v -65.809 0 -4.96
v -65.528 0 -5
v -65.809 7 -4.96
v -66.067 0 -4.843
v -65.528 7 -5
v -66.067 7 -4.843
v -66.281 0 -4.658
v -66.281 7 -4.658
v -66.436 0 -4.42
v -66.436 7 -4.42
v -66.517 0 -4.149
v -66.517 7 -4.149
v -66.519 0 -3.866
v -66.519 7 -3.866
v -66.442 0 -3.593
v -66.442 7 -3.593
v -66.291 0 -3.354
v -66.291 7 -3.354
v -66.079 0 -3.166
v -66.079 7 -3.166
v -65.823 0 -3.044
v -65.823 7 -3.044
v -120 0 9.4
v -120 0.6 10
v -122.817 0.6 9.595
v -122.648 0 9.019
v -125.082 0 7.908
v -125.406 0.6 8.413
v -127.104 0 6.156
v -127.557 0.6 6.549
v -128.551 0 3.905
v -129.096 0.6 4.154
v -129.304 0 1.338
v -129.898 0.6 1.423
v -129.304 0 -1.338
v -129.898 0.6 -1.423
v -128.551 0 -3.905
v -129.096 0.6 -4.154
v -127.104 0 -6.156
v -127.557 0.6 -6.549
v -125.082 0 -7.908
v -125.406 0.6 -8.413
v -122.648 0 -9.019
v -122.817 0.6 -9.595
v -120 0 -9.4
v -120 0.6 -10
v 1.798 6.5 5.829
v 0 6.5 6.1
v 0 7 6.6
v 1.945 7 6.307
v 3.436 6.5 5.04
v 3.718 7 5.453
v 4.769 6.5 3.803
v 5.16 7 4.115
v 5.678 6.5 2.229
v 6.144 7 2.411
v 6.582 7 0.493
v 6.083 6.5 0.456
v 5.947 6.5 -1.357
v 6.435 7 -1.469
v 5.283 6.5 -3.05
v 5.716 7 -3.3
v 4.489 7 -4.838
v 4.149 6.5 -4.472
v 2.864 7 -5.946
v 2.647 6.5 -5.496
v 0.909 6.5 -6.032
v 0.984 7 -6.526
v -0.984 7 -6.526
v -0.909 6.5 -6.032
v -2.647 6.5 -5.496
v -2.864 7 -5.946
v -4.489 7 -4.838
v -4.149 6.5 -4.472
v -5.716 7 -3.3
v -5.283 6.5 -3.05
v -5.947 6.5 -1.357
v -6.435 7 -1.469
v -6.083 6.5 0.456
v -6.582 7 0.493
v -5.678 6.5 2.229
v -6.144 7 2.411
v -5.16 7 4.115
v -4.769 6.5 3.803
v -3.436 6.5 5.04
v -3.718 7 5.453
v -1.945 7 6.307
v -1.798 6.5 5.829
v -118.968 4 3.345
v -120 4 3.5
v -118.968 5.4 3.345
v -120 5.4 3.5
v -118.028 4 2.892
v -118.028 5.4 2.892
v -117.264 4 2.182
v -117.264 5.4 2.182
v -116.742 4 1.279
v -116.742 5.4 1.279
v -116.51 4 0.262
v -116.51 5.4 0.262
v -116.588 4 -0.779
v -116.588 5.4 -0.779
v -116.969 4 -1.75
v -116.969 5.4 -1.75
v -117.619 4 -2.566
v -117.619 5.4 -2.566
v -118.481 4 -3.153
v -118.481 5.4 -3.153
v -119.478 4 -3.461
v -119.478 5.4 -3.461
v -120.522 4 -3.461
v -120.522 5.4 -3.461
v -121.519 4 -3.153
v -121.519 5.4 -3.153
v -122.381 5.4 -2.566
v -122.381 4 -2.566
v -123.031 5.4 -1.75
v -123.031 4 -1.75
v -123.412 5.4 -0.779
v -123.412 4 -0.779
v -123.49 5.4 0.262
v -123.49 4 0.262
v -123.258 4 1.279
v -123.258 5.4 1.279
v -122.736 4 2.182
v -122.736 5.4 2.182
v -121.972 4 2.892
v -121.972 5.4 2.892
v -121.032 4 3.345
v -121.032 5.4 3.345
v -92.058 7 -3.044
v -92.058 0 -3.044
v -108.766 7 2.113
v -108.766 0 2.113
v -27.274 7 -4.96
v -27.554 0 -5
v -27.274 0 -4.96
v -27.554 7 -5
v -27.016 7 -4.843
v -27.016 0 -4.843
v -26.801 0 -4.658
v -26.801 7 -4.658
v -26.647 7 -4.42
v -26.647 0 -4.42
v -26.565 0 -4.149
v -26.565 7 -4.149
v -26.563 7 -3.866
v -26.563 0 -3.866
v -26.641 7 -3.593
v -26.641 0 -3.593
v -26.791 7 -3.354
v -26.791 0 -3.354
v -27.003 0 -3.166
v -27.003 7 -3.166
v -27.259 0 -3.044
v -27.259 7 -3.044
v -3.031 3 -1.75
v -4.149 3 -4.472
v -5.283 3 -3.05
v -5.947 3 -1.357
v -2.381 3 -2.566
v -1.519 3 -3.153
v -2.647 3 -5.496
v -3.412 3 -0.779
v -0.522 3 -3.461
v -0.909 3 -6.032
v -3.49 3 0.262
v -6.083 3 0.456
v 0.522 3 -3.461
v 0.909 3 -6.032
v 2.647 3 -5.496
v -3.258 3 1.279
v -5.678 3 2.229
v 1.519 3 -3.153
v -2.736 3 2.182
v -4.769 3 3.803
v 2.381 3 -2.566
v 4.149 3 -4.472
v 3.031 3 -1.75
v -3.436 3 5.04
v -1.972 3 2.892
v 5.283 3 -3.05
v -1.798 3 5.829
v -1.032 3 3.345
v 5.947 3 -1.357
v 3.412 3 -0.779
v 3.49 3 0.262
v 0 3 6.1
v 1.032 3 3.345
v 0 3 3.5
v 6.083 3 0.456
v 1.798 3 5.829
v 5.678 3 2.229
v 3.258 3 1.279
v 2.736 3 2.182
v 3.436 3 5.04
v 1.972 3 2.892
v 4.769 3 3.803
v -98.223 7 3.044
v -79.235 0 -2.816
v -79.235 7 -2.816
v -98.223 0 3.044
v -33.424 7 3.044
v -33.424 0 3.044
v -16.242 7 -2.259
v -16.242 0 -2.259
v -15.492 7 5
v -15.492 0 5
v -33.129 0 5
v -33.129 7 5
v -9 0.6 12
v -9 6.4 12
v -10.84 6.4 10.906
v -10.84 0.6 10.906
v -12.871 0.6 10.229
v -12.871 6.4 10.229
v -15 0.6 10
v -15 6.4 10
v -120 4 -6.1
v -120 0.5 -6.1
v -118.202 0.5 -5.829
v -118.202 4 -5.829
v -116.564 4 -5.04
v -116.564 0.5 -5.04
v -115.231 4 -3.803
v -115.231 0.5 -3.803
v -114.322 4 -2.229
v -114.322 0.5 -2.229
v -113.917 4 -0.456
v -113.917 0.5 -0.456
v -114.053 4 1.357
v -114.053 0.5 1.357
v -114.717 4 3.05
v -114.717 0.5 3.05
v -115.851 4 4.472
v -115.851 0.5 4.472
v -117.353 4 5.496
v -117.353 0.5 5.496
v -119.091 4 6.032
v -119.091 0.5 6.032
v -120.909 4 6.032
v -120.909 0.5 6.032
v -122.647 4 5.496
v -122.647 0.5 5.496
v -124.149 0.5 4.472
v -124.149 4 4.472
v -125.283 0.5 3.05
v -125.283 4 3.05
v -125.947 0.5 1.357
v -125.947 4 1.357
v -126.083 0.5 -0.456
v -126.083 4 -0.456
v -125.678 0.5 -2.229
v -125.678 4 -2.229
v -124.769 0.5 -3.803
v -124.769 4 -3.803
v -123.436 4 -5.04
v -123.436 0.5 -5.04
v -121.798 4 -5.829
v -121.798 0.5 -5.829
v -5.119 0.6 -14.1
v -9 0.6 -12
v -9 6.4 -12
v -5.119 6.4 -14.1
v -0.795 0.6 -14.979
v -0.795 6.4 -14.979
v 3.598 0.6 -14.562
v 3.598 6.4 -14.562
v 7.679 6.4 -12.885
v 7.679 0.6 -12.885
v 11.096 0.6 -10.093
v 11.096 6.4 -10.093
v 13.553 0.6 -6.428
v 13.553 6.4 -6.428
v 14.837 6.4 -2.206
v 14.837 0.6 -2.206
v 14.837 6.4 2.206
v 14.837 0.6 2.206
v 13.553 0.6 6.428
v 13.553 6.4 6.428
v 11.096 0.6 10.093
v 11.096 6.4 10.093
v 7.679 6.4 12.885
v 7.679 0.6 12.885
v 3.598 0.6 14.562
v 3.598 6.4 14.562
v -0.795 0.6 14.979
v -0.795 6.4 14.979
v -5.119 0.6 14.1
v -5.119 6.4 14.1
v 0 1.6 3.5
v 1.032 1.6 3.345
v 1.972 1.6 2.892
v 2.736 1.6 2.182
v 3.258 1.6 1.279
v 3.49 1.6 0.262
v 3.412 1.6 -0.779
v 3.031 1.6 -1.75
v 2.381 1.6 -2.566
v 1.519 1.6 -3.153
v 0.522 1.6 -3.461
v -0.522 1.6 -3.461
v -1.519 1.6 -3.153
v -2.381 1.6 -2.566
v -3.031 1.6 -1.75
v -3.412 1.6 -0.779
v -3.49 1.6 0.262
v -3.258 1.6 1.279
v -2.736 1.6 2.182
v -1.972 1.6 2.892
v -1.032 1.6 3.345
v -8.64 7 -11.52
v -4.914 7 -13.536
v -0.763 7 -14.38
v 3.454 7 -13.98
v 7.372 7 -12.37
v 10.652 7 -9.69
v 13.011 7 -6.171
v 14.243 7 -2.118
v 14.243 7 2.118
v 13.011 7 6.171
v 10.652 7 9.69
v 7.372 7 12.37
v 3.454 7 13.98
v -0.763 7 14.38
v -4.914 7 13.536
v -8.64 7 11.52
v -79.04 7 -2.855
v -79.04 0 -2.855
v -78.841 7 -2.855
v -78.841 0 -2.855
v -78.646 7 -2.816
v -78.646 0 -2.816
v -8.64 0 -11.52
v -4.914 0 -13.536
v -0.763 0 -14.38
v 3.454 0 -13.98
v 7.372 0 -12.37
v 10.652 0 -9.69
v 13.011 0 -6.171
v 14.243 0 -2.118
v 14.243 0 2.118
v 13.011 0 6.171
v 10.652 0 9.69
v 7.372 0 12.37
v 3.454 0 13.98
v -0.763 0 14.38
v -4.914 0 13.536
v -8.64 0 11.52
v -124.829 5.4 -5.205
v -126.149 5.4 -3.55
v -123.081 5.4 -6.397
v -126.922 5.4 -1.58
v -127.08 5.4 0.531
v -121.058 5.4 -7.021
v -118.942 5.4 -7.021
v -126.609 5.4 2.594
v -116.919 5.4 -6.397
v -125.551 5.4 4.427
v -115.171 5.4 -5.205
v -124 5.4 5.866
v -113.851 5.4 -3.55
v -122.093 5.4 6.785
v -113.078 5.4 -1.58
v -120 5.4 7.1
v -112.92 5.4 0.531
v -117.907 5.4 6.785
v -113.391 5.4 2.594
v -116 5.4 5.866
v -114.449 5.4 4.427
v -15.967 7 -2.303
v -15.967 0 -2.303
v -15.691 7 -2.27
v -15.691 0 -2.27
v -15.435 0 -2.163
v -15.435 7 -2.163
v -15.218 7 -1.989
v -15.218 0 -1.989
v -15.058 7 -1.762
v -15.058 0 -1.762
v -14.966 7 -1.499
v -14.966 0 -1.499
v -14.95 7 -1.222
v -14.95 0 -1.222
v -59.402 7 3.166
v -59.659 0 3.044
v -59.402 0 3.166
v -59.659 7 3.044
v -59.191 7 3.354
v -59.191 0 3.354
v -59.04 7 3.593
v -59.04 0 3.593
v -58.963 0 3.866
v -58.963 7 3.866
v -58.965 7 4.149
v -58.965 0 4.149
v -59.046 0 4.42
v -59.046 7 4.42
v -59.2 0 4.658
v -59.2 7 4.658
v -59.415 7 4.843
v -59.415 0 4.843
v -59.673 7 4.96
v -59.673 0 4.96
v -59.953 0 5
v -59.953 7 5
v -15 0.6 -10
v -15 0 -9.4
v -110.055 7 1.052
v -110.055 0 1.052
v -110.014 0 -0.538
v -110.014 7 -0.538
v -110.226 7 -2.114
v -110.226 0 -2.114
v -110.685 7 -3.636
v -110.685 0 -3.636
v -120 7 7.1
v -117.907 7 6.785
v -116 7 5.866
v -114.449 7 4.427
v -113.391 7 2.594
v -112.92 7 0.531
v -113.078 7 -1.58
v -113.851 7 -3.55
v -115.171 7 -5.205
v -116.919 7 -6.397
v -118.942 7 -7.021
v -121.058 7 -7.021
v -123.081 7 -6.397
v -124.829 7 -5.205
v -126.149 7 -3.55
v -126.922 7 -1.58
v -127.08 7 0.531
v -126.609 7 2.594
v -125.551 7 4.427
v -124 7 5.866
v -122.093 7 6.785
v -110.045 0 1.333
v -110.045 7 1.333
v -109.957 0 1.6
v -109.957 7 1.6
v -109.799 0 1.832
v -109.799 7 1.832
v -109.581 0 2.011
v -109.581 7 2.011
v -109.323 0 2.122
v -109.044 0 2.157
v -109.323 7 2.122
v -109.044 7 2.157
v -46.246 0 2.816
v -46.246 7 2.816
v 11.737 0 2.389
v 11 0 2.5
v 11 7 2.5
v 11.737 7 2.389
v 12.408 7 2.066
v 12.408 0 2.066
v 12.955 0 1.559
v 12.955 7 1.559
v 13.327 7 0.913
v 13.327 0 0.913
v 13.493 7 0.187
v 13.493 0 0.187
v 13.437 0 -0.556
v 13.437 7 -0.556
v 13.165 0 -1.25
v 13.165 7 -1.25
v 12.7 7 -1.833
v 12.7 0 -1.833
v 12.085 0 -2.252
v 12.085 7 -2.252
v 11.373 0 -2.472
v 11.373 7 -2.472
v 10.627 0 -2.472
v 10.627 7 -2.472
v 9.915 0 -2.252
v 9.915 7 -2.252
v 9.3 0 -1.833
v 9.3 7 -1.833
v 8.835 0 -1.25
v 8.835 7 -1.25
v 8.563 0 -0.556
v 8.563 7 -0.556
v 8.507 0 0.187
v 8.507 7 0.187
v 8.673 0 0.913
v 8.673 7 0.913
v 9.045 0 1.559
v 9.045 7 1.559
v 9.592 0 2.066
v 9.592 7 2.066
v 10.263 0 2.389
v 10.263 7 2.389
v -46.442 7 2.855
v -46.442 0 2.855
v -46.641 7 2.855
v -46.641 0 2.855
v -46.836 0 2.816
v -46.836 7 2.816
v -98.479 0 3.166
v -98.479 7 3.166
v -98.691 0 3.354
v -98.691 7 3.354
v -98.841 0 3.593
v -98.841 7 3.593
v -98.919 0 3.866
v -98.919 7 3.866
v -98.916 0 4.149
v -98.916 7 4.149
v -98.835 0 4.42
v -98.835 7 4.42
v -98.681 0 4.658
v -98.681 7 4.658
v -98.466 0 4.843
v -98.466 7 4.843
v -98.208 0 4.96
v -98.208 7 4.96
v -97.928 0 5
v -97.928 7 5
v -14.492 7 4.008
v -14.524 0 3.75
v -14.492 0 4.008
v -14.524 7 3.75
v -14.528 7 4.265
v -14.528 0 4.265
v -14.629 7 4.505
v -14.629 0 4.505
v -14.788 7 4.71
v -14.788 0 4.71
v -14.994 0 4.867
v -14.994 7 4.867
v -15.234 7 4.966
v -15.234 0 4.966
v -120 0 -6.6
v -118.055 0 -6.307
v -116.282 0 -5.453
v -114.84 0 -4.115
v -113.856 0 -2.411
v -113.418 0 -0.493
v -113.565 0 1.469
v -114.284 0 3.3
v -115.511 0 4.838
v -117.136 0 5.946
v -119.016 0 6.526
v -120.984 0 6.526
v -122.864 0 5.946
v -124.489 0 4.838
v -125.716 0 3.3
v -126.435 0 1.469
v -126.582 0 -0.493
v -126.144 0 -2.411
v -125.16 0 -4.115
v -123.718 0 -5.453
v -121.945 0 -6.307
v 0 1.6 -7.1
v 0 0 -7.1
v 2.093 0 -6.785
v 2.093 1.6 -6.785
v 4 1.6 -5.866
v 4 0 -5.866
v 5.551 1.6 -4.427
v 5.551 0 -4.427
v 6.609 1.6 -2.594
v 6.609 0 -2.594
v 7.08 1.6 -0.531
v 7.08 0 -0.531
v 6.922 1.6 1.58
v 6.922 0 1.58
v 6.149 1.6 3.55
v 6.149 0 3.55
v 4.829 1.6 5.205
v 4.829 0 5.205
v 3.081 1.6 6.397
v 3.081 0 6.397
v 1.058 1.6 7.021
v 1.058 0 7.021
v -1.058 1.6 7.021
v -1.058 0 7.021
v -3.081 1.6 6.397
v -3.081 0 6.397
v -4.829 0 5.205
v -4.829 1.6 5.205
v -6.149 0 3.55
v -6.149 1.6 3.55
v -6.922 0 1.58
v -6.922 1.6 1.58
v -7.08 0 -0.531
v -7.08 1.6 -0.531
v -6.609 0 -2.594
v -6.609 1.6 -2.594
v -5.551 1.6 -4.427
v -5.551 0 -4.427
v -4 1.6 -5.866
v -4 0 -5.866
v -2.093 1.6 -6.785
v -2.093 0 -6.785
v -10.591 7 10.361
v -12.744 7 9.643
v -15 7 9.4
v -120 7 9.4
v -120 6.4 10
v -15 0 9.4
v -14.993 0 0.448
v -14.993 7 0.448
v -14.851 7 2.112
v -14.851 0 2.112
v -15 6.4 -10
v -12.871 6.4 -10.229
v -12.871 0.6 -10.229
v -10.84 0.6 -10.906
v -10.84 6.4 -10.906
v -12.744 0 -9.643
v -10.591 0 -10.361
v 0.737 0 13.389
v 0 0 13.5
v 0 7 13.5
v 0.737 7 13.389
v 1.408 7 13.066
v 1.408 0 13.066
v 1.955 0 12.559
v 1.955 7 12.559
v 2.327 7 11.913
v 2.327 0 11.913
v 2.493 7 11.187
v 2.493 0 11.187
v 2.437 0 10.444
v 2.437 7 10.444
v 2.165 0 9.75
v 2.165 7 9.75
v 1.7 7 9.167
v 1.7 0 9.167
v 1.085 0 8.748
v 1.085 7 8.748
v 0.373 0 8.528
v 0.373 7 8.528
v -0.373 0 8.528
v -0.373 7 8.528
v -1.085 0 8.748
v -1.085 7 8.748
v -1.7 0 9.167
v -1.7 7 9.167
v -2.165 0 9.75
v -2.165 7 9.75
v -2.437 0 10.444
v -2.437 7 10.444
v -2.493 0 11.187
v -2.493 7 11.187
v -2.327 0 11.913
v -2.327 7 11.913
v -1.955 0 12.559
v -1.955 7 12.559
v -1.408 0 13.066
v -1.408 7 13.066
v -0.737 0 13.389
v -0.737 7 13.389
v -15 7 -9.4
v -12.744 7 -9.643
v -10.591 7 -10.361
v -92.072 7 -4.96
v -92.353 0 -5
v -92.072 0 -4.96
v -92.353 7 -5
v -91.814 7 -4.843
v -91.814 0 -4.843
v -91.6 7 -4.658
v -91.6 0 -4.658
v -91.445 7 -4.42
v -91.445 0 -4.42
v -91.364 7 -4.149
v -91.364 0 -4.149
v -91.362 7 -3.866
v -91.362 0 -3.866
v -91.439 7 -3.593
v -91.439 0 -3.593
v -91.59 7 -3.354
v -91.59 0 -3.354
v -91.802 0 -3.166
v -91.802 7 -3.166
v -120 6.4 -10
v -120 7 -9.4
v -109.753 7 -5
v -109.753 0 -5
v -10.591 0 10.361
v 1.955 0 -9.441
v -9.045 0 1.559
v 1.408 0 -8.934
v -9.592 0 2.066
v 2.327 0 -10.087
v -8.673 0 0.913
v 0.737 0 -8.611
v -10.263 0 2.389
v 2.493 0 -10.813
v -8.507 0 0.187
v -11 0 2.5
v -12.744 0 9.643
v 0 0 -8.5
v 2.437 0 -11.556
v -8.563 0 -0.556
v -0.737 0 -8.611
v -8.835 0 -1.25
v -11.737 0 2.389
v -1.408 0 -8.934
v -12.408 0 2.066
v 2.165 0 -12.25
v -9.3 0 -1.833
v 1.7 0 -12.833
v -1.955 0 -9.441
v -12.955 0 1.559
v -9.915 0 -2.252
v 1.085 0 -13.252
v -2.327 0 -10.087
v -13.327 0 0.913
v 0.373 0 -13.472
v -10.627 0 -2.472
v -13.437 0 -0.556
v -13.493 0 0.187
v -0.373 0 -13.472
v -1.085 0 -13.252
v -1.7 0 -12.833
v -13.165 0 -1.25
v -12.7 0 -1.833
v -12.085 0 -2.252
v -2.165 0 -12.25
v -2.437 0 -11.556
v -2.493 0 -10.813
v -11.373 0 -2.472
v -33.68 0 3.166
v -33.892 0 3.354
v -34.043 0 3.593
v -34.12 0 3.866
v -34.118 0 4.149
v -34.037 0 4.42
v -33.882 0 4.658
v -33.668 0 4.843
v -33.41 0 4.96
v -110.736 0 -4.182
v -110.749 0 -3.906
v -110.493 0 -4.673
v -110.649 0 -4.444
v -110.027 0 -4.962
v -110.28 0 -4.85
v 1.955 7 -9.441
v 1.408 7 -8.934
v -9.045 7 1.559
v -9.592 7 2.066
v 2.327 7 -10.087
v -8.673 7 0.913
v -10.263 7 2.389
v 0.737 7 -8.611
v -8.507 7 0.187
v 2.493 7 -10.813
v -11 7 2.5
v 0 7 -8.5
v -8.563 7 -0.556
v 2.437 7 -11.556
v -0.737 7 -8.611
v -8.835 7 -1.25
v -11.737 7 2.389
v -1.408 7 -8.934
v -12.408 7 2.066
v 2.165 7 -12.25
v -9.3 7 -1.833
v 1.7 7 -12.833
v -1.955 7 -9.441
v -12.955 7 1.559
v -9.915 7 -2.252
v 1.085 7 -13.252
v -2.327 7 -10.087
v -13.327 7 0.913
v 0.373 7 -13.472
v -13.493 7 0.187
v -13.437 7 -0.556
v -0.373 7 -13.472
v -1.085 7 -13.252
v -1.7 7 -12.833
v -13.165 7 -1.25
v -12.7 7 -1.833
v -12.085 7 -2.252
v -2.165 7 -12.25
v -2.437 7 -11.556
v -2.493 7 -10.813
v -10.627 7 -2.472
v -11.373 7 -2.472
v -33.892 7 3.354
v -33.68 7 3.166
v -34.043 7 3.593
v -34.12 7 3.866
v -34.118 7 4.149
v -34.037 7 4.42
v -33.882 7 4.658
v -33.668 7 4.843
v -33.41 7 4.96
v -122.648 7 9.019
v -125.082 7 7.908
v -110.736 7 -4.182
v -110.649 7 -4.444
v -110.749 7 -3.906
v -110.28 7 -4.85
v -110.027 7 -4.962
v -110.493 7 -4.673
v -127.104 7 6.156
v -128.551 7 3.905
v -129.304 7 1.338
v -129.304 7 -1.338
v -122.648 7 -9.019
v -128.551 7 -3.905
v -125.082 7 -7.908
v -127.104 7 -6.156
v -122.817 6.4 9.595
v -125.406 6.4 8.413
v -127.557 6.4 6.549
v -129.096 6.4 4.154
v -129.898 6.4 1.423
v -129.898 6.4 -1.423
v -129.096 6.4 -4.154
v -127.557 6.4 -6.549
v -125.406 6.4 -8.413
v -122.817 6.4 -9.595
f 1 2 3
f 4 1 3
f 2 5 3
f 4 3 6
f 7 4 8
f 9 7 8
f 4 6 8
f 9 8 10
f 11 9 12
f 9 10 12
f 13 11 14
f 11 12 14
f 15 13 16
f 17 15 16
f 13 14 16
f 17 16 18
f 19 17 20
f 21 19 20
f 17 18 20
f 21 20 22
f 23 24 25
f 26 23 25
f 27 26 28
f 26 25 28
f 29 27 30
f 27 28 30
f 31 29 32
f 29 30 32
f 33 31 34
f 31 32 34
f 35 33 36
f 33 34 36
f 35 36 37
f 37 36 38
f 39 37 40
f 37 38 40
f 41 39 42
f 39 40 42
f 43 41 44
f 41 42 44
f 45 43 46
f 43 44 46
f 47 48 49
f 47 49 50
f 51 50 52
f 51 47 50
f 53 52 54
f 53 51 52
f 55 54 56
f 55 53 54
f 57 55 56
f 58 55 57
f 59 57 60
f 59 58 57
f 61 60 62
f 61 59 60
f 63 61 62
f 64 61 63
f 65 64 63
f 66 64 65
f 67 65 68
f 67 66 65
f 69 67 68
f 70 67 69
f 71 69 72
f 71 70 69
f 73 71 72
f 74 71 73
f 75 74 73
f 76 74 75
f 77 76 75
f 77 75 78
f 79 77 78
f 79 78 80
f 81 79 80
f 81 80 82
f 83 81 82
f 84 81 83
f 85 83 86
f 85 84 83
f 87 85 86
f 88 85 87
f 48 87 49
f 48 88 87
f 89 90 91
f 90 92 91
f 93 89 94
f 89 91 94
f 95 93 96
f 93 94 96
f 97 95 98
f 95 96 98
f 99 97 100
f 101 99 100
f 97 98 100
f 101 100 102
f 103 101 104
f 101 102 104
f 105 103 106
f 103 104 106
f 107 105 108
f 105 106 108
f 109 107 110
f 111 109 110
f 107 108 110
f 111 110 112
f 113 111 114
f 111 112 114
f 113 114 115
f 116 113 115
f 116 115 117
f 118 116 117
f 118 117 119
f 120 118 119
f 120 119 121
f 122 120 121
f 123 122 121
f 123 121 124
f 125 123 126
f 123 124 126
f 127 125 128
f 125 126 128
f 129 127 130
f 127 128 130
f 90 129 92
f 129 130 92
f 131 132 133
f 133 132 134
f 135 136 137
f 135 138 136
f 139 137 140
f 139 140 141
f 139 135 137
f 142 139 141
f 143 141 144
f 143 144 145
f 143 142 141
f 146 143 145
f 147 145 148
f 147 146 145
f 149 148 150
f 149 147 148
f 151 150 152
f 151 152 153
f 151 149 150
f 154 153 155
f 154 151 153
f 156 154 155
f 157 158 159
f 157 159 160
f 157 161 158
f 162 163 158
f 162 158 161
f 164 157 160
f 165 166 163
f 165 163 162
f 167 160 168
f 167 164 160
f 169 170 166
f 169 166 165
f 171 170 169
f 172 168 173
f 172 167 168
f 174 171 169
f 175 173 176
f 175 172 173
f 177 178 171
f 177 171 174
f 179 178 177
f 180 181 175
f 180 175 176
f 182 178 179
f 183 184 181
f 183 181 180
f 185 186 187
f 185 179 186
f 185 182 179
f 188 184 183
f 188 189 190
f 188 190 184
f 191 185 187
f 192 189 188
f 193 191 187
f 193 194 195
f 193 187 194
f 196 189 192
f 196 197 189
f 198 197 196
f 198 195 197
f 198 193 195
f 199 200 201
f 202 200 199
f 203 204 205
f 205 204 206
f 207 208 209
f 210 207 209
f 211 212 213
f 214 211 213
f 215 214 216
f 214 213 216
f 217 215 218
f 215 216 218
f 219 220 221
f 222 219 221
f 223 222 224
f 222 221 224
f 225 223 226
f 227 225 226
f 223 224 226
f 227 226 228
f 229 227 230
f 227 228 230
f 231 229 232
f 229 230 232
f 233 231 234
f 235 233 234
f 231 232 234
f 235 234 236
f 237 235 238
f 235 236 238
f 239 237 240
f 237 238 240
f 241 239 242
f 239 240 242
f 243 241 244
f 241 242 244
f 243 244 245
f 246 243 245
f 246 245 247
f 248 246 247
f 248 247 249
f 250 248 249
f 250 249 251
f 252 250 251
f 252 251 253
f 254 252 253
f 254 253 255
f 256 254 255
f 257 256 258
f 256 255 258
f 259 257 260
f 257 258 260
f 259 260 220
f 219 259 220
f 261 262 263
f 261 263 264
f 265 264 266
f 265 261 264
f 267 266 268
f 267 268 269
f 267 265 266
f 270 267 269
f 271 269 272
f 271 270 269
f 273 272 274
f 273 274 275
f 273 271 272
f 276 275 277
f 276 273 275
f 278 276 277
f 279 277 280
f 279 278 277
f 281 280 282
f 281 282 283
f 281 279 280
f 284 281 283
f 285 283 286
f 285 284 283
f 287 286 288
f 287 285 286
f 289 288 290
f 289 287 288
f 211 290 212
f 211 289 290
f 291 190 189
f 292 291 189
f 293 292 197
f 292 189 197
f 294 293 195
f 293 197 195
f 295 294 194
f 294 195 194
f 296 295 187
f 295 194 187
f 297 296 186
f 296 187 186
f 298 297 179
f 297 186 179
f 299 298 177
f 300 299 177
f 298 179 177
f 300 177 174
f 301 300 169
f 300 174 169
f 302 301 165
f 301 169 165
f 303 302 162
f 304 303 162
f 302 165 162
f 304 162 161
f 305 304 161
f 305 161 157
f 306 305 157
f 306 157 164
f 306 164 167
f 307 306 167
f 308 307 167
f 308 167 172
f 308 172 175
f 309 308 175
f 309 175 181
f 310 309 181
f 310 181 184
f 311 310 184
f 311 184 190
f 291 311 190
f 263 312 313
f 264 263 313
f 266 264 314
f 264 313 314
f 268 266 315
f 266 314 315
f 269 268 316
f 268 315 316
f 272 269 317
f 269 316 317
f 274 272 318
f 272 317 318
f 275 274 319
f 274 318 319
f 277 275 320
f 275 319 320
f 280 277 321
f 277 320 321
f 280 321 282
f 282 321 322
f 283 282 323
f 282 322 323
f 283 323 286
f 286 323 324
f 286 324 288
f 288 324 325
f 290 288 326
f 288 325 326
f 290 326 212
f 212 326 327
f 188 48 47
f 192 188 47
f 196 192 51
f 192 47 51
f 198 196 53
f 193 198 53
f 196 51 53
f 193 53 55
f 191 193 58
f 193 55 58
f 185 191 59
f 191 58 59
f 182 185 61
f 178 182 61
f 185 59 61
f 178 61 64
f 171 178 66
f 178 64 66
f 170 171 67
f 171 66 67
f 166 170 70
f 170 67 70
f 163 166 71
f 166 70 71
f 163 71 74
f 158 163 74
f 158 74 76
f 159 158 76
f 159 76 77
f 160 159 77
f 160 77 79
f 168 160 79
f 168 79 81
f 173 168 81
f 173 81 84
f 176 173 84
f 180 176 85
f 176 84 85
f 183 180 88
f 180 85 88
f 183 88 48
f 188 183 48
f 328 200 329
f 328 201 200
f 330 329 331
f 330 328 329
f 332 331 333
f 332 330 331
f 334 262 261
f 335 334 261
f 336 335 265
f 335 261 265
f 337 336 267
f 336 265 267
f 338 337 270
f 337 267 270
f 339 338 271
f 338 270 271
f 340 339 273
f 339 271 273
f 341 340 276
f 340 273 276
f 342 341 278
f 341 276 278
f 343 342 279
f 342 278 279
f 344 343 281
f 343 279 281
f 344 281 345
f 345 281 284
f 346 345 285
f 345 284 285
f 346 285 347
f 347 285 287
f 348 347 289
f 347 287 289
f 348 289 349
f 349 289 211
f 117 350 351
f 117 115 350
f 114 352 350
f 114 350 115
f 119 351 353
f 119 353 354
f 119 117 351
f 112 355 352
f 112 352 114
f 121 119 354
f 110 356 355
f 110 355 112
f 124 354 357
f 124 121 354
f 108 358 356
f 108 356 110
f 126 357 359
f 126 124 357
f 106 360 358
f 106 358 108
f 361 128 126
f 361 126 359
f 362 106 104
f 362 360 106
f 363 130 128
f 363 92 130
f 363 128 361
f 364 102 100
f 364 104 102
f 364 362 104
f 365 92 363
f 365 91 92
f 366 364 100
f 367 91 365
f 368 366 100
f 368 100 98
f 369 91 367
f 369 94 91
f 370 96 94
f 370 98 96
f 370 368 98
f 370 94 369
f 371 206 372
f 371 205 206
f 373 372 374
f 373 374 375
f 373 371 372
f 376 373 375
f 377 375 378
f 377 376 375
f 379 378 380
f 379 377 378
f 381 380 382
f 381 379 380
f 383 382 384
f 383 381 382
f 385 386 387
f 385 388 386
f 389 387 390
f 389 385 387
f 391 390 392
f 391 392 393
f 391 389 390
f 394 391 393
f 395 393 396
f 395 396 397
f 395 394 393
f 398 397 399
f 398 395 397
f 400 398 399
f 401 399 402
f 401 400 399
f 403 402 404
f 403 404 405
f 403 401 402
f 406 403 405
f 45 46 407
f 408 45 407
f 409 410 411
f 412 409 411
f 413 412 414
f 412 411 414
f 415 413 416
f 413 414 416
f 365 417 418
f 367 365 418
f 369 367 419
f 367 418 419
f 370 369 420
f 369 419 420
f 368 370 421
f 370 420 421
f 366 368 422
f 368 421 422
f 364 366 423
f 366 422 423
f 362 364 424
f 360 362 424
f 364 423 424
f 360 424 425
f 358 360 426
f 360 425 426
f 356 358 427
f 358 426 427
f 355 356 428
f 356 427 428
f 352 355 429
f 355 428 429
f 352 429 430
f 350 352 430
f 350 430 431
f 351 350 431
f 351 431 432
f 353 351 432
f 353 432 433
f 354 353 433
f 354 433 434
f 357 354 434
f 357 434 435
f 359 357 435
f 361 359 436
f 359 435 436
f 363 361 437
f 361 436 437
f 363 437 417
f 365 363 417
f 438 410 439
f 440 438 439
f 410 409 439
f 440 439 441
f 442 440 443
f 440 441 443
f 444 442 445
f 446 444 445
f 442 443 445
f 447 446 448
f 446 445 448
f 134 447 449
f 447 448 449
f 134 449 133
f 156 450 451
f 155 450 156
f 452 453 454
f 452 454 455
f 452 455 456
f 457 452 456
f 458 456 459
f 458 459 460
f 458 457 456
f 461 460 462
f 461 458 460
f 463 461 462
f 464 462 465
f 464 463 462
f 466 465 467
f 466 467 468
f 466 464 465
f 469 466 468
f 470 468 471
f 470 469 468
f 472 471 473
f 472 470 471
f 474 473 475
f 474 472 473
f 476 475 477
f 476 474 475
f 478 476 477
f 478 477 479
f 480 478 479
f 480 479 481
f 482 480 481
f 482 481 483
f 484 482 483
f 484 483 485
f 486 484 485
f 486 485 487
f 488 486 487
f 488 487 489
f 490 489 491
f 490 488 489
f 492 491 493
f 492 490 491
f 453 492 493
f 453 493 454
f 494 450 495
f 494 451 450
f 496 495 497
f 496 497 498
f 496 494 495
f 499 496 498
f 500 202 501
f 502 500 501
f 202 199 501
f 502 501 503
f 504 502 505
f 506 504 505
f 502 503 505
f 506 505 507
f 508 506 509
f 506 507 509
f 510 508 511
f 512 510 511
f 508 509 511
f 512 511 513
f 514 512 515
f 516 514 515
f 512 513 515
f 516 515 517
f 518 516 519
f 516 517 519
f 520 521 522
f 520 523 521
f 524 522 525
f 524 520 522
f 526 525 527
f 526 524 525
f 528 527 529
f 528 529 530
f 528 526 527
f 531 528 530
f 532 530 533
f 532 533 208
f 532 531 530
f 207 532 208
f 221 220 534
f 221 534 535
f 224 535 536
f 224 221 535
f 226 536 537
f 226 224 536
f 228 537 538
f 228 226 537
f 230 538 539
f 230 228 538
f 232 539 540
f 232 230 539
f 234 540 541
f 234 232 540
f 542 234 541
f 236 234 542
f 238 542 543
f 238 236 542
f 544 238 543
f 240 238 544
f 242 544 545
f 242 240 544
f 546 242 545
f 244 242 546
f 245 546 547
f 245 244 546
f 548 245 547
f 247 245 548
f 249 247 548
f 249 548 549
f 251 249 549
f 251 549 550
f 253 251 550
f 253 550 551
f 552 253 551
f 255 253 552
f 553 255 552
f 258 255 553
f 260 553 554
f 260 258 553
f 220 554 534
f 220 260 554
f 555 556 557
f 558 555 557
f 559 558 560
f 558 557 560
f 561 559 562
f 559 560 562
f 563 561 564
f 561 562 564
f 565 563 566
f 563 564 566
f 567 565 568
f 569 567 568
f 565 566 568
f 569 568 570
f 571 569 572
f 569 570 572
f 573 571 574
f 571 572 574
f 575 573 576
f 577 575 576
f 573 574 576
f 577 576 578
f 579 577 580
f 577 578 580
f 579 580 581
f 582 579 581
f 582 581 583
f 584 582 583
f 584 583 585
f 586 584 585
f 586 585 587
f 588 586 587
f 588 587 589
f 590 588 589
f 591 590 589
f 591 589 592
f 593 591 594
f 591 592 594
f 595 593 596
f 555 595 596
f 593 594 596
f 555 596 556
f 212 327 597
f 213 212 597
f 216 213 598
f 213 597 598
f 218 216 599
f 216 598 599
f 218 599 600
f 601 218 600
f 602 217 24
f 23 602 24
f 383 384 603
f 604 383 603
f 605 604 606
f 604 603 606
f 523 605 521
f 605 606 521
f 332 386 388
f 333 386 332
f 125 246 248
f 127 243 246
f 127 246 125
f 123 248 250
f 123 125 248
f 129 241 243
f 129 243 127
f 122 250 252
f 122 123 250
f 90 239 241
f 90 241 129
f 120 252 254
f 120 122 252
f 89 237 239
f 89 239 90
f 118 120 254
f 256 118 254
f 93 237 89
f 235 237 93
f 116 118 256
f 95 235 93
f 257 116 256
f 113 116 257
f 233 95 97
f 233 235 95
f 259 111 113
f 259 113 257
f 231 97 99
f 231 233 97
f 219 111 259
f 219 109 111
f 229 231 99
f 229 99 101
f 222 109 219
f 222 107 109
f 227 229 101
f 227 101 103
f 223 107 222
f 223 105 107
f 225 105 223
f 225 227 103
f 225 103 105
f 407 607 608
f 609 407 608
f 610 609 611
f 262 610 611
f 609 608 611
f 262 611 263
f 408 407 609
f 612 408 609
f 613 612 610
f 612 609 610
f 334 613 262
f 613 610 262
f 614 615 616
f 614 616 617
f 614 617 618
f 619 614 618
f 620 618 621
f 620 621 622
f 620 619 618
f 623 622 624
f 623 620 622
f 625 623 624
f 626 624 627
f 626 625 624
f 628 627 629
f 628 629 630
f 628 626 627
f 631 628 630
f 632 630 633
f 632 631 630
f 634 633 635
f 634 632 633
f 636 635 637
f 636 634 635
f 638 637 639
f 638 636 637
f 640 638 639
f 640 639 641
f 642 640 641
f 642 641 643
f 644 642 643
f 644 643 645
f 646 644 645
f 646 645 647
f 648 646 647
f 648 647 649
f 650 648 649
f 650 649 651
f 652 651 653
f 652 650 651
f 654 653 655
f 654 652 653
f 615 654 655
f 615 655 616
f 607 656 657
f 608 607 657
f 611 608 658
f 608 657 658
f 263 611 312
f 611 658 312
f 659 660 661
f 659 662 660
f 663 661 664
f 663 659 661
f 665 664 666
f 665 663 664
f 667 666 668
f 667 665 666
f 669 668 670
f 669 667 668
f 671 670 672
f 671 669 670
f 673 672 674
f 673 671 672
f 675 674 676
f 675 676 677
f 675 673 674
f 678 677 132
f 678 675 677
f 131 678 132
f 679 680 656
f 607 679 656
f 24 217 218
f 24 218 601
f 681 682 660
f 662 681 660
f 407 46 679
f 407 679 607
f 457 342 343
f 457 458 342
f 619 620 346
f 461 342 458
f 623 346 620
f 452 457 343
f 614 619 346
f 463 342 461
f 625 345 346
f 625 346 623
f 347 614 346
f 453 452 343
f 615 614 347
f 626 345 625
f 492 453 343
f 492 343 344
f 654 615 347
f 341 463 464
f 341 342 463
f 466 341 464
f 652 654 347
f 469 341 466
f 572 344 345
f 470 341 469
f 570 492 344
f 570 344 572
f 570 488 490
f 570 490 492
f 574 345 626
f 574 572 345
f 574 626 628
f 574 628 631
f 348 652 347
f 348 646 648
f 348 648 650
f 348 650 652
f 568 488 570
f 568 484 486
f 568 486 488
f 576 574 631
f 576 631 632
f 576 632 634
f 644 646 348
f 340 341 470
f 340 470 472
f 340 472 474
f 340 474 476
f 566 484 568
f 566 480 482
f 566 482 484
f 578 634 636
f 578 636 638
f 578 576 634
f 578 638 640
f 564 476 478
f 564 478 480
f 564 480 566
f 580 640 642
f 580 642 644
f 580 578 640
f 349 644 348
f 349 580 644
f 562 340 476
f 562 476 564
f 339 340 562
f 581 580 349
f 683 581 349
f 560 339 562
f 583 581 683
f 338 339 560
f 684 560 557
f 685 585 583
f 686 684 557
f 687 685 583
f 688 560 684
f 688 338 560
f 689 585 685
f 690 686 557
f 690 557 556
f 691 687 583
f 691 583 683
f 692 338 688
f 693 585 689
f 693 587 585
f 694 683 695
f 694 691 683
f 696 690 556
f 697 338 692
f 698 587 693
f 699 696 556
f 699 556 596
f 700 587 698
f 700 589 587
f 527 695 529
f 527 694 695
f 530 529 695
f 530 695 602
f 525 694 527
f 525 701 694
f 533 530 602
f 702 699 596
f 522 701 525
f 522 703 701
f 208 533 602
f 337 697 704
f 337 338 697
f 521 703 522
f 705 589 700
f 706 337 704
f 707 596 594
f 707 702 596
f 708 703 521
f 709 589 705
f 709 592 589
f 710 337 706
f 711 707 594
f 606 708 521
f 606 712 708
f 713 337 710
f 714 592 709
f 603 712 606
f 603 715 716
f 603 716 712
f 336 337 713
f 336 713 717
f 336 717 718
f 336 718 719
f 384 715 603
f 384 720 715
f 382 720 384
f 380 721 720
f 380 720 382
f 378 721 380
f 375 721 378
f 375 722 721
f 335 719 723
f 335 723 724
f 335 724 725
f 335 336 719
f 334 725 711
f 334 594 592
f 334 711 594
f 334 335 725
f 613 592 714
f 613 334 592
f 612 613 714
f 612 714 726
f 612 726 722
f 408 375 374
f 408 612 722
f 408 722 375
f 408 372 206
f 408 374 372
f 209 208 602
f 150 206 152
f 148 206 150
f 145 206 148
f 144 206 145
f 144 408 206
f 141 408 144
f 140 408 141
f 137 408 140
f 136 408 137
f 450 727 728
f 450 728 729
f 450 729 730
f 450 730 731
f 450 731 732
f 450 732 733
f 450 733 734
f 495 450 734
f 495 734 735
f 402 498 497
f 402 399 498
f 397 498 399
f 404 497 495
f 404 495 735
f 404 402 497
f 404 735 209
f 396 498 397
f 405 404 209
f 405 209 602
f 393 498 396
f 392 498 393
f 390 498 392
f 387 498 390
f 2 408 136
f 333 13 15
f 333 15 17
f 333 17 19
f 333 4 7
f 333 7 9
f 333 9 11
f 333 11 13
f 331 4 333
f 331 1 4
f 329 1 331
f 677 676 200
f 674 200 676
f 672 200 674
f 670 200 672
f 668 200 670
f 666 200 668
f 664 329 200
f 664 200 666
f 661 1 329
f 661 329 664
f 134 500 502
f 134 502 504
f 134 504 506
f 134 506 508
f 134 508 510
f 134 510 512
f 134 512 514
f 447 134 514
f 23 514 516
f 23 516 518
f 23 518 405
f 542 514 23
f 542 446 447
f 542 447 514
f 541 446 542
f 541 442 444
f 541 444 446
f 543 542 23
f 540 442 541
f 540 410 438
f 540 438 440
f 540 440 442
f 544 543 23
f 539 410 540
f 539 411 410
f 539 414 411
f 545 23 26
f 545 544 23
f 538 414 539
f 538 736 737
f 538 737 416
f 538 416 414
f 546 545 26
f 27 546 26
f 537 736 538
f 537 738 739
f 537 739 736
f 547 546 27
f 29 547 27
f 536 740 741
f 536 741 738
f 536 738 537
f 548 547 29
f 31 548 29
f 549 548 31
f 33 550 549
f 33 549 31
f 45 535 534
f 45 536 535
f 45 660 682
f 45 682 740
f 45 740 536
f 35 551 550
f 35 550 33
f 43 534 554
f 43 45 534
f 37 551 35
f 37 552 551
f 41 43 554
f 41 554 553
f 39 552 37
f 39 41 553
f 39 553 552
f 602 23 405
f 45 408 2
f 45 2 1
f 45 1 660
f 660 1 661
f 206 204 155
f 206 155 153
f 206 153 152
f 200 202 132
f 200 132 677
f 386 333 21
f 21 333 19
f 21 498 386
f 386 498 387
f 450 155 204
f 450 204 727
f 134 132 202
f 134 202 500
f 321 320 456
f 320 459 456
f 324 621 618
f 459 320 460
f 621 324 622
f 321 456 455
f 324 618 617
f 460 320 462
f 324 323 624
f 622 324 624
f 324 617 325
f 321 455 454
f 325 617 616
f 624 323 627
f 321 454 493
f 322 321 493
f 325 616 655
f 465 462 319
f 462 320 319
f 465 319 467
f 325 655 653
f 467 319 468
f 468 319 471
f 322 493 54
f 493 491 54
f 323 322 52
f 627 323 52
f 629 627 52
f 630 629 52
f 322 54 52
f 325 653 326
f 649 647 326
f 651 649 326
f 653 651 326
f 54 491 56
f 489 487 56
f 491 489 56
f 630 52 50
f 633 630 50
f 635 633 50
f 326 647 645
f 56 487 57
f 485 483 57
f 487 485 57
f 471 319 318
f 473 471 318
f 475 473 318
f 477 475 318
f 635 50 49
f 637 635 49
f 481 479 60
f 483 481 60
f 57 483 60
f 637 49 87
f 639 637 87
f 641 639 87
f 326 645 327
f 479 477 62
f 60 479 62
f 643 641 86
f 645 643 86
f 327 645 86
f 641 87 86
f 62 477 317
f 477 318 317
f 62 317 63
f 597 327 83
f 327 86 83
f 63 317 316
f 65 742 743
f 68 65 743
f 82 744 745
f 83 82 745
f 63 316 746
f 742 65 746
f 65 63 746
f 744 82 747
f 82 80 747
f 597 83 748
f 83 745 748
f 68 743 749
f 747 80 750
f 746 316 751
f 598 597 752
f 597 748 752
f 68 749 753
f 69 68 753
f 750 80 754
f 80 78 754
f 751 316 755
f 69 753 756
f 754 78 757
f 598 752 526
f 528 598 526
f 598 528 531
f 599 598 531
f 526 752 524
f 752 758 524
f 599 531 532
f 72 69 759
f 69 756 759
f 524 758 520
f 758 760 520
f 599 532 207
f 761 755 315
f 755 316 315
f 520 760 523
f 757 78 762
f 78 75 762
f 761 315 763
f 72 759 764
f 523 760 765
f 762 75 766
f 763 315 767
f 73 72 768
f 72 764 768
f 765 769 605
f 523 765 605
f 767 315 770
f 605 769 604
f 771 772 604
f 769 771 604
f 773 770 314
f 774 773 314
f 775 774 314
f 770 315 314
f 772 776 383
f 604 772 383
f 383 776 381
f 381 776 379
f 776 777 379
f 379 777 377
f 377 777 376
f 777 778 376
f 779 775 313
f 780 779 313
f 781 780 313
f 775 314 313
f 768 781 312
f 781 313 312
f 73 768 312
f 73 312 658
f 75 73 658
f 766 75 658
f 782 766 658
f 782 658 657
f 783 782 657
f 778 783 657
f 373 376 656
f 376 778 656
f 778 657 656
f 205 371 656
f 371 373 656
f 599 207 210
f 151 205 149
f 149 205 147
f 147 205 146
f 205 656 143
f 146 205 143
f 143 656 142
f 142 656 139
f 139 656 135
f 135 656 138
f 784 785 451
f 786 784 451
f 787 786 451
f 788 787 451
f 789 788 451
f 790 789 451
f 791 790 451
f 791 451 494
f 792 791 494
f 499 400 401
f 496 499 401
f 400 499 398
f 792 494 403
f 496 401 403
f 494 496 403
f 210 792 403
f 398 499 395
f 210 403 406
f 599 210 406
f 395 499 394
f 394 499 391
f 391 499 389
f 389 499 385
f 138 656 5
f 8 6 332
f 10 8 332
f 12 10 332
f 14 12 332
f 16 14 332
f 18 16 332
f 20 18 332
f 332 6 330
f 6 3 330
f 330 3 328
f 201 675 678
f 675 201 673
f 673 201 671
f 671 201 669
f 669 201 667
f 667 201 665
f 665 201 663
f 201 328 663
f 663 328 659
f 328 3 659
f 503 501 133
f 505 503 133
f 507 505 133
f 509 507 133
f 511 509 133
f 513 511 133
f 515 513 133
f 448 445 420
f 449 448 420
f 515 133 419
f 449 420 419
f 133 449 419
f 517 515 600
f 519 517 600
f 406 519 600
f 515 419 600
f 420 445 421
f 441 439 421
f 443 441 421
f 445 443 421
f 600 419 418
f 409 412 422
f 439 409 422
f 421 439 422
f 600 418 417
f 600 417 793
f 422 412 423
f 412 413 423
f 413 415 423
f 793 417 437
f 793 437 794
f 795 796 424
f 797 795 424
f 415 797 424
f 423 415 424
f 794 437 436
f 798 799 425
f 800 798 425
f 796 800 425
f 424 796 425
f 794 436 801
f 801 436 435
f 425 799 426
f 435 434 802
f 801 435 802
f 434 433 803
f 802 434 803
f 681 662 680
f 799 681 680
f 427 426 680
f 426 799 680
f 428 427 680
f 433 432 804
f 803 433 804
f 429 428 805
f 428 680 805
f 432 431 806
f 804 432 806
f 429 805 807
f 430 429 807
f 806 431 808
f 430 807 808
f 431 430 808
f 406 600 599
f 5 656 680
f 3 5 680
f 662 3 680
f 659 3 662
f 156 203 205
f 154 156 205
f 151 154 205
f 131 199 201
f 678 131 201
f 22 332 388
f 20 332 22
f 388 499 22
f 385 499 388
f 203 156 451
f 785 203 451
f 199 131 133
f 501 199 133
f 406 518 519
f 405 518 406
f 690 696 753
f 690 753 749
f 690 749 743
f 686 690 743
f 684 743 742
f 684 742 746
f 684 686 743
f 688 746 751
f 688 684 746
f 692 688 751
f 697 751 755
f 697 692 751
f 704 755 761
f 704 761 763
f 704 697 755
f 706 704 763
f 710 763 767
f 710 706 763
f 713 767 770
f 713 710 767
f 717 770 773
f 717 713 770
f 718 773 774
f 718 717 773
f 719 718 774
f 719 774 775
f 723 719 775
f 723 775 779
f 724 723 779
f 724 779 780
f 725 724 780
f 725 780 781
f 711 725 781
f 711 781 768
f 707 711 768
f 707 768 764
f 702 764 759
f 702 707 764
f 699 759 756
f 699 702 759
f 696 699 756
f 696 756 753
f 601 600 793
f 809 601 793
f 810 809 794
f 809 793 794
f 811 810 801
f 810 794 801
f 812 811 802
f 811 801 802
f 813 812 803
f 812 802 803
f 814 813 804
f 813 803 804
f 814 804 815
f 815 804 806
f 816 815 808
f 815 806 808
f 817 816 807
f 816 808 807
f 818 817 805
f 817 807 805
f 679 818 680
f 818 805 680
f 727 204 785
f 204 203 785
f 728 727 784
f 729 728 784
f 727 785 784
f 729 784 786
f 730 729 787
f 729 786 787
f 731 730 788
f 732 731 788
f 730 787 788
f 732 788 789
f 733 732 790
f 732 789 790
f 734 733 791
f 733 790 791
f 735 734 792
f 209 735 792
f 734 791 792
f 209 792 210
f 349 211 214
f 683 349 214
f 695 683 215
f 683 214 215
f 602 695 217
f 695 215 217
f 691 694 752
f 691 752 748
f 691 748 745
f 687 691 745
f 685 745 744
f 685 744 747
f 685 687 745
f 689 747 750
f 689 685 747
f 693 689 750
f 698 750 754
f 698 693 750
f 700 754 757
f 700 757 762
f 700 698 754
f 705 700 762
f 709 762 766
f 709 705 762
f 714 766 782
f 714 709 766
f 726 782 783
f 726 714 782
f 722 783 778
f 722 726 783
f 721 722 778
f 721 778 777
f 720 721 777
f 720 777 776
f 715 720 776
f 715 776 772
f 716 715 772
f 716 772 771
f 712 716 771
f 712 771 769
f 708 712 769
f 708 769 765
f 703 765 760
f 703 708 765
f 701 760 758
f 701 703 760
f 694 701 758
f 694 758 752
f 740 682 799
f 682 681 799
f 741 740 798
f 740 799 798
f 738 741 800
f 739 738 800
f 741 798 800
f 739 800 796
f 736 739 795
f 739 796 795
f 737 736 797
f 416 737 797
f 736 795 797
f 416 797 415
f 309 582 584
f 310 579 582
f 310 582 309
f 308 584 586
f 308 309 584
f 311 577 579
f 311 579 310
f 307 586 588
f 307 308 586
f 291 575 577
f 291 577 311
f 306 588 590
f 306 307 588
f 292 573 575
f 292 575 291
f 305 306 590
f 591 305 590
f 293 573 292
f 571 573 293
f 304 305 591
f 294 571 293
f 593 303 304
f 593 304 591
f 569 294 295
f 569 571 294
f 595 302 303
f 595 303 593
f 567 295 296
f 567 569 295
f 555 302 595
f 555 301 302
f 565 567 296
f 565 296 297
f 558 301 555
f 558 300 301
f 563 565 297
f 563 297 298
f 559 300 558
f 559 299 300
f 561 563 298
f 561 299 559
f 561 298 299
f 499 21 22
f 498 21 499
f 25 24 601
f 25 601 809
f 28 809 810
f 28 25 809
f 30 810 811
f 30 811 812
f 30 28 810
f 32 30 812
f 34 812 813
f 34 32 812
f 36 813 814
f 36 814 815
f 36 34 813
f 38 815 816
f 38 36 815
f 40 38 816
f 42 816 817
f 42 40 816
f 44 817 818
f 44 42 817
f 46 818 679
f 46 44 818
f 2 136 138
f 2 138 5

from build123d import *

# Parameters (mm, degrees)
SKETCH_1_R          = 2.5
EXTRUDE_1_DEPTH     = 7
FILLET_1_R          = 1
FILLET_2_R          = 1
FILLET_3_R          = 1
FILLET_4_R          = 1
FILLET_5_R          = 10
SKETCH_2_R          = 7.1
CUT_EXTRUDE_1_DEPTH = 1.6
SKETCH_3_R          = 6.1
CUT_EXTRUDE_2_DEPTH = 4
SKETCH_4_R          = 6.1
CUT_EXTRUDE_4_DEPTH = 4
SKETCH_5_R          = 7.1
CUT_EXTRUDE_5_DEPTH = 1.6
SKETCH_6_R          = 3.5
CUT_EXTRUDE_6_DEPTH = 5
CHAMFER_1_SIZE      = 0.6
CHAMFER_2_SIZE      = 0.5


with BuildPart() as part:
    # 草图1 → 凸台-拉伸1 (new body)
    with BuildSketch(Plane(origin=(0, 0, 0), x_dir=(1, 0, 0), z_dir=(0, 1, 0))):
        with BuildLine():
            Line((-120, 10), (-11.180339887, 10))
            ThreePointArc((-11.180339887, 10), (15, 0), (-11.180339887, -10))
            Line((-11.180339887, -10), (-120, -10))
            ThreePointArc((-120, -10), (-130, 0), (-120, 10))
        make_face()
        with Locations(Location((-11, 0, 0), (0, 0, 270))):
            Circle(SKETCH_1_R, mode=Mode.SUBTRACT)
        with Locations(Location((0, 11, 0), (0, 0, 270))):
            Circle(SKETCH_1_R, mode=Mode.SUBTRACT)
        with Locations(Location((11, 0, 0), (0, 0, 270))):
            Circle(SKETCH_1_R, mode=Mode.SUBTRACT)
        with Locations(Location((0, -11, 0), (0, 0, 270))):
            Circle(SKETCH_1_R, mode=Mode.SUBTRACT)
        Polygon((-104.558275962, -5), (-53.32280907, -5), (-78.940542516, 2.906902245), align=None, mode=Mode.SUBTRACT)
        with BuildLine():
            Line((-111.339745962, 5), (-85.722012516, 5))
            Line((-85.722012516, 5), (-110.343778499, -2.599497322))
            ThreePointArc((-110.343778499, -2.599497322), (-110.084789012, 1.299457992), (-111.339745962, 5))
        make_face(mode=Mode.SUBTRACT)
        Polygon((-72.159072516, 5), (-46.54133907, -2.906902245), (-20.923605624, 5), align=None, mode=Mode.SUBTRACT)
        with BuildLine():
            Line((-39.75986907, -5), (-14.751545054, 2.71880829))
            ThreePointArc((-14.751545054, 2.71880829), (-14.953467696, -1.180594709), (-14.142135624, -5))
            Line((-14.142135624, -5), (-39.75986907, -5))
        make_face(mode=Mode.SUBTRACT)
    extrude(amount=EXTRUDE_1_DEPTH)

    # 圆角1
    fillet_1_edges = [part.edges().sort_by_distance(p)[0] for p in [
        (-85.722012516, 3.5, -5),
        (-111.339745962, 3.5, -5),
        (-110.343778499, 3.5, 2.599497322),
    ]]
    fillet(fillet_1_edges, radius=FILLET_1_R)

    # 圆角2
    fillet_2_edges = [part.edges().sort_by_distance(p)[0] for p in [
        (-104.558275962, 3.5, 5),
        (-53.32280907, 3.5, 5),
        (-78.940542516, 3.5, -2.906902245),
    ]]
    fillet(fillet_2_edges, radius=FILLET_2_R)

    # 圆角3
    fillet_3_edges = [part.edges().sort_by_distance(p)[0] for p in [
        (-46.54133907, 3.5, 2.906902245),
        (-20.923605624, 3.5, -5),
        (-72.159072516, 3.5, -5),
    ]]
    fillet(fillet_3_edges, radius=FILLET_3_R)

    # 圆角4
    fillet_4_edges = [part.edges().sort_by_distance(p)[0] for p in [
        (-39.75986907, 3.5, 5),
        (-14.142135624, 3.5, 5),
        (-14.751545054, 3.5, -2.71880829),
    ]]
    fillet(fillet_4_edges, radius=FILLET_4_R)

    # 圆角5
    fillet_5_edges = [part.edges().sort_by_distance(p)[0] for p in [
        (-11.180339887, 3.5, -10),
        (-11.180339887, 3.5, 10),
    ]]
    fillet(fillet_5_edges, radius=FILLET_5_R)

    # 草图2 → 切除-拉伸1 (cut)
    with BuildSketch(Plane(origin=(0, 0, 0), x_dir=(-1, 0, 0), z_dir=(0, -1, 0))):
        with Locations(Location((0, 0, 0), (0, 0, 90))):
            Circle(SKETCH_2_R)
    extrude(amount=-CUT_EXTRUDE_1_DEPTH, mode=Mode.SUBTRACT)

    # 草图3 → 切除-拉伸2 (cut)
    with BuildSketch(Plane(origin=(0, 0, 0), x_dir=(-1, 0, 0), z_dir=(0, -1, 0))):
        with Locations(Location((120, 0, 0), (0, 0, 90))):
            Circle(SKETCH_3_R)
    extrude(amount=-CUT_EXTRUDE_2_DEPTH, mode=Mode.SUBTRACT)

    # 草图4 → 切除-拉伸4 (cut)
    with BuildSketch(Plane(origin=(0, 7, 0), x_dir=(1, 0, 0), z_dir=(0, 1, 0))):
        with Locations(Location((0, 0, 0), (0, 0, 270))):
            Circle(SKETCH_4_R)
    extrude(amount=-CUT_EXTRUDE_4_DEPTH, mode=Mode.SUBTRACT)

    # 草图5 → 切除-拉伸5 (cut)
    with BuildSketch(Plane(origin=(0, 7, 0), x_dir=(1, 0, 0), z_dir=(0, 1, 0))):
        with Locations(Location((-120, 0, 0), (0, 0, 270))):
            Circle(SKETCH_5_R)
    extrude(amount=-CUT_EXTRUDE_5_DEPTH, mode=Mode.SUBTRACT)

    # 草图6 → 切除-拉伸6 (cut, symmetric)
    with BuildSketch(Plane(origin=(0, 3, 0), x_dir=(1, 0, 0), z_dir=(0, 1, 0))):
        with Locations(Location((0, 0, 0), (0, 0, 270))):
            Circle(SKETCH_6_R)
        with Locations(Location((-120, 0, 0), (0, 0, 270))):
            Circle(SKETCH_6_R)
    extrude(amount=CUT_EXTRUDE_6_DEPTH, both=True, mode=Mode.SUBTRACT)

    # 倒角1
    chamfer_1_edges = [part.edges().sort_by_distance(p)[0] for p in [
        (15, 0, 0),
        (15, 7, 0),
        (-11.83772234, 0, 10.513167019),
        (-11.83772234, 7, 10.513167019),
        (-11.83772234, 0, -10.513167019),
        (-11.83772234, 7, -10.513167019),
        (-130, 0, 0),
        (-67.5, 0, -10),
        (-67.5, 0, 10),
        (-67.5, 7, 10),
        (-67.5, 7, -10),
        (-130, 7, 0),
    ]]
    chamfer(chamfer_1_edges, length=CHAMFER_1_SIZE)

    # 倒角2
    chamfer_2_edges = [part.edges().sort_by_distance(p)[0] for p in [
        (-120, 0, 6.1),
        (0, 7, -6.1),
    ]]
    chamfer(chamfer_2_edges, length=CHAMFER_2_SIZE)


solid = part.part
